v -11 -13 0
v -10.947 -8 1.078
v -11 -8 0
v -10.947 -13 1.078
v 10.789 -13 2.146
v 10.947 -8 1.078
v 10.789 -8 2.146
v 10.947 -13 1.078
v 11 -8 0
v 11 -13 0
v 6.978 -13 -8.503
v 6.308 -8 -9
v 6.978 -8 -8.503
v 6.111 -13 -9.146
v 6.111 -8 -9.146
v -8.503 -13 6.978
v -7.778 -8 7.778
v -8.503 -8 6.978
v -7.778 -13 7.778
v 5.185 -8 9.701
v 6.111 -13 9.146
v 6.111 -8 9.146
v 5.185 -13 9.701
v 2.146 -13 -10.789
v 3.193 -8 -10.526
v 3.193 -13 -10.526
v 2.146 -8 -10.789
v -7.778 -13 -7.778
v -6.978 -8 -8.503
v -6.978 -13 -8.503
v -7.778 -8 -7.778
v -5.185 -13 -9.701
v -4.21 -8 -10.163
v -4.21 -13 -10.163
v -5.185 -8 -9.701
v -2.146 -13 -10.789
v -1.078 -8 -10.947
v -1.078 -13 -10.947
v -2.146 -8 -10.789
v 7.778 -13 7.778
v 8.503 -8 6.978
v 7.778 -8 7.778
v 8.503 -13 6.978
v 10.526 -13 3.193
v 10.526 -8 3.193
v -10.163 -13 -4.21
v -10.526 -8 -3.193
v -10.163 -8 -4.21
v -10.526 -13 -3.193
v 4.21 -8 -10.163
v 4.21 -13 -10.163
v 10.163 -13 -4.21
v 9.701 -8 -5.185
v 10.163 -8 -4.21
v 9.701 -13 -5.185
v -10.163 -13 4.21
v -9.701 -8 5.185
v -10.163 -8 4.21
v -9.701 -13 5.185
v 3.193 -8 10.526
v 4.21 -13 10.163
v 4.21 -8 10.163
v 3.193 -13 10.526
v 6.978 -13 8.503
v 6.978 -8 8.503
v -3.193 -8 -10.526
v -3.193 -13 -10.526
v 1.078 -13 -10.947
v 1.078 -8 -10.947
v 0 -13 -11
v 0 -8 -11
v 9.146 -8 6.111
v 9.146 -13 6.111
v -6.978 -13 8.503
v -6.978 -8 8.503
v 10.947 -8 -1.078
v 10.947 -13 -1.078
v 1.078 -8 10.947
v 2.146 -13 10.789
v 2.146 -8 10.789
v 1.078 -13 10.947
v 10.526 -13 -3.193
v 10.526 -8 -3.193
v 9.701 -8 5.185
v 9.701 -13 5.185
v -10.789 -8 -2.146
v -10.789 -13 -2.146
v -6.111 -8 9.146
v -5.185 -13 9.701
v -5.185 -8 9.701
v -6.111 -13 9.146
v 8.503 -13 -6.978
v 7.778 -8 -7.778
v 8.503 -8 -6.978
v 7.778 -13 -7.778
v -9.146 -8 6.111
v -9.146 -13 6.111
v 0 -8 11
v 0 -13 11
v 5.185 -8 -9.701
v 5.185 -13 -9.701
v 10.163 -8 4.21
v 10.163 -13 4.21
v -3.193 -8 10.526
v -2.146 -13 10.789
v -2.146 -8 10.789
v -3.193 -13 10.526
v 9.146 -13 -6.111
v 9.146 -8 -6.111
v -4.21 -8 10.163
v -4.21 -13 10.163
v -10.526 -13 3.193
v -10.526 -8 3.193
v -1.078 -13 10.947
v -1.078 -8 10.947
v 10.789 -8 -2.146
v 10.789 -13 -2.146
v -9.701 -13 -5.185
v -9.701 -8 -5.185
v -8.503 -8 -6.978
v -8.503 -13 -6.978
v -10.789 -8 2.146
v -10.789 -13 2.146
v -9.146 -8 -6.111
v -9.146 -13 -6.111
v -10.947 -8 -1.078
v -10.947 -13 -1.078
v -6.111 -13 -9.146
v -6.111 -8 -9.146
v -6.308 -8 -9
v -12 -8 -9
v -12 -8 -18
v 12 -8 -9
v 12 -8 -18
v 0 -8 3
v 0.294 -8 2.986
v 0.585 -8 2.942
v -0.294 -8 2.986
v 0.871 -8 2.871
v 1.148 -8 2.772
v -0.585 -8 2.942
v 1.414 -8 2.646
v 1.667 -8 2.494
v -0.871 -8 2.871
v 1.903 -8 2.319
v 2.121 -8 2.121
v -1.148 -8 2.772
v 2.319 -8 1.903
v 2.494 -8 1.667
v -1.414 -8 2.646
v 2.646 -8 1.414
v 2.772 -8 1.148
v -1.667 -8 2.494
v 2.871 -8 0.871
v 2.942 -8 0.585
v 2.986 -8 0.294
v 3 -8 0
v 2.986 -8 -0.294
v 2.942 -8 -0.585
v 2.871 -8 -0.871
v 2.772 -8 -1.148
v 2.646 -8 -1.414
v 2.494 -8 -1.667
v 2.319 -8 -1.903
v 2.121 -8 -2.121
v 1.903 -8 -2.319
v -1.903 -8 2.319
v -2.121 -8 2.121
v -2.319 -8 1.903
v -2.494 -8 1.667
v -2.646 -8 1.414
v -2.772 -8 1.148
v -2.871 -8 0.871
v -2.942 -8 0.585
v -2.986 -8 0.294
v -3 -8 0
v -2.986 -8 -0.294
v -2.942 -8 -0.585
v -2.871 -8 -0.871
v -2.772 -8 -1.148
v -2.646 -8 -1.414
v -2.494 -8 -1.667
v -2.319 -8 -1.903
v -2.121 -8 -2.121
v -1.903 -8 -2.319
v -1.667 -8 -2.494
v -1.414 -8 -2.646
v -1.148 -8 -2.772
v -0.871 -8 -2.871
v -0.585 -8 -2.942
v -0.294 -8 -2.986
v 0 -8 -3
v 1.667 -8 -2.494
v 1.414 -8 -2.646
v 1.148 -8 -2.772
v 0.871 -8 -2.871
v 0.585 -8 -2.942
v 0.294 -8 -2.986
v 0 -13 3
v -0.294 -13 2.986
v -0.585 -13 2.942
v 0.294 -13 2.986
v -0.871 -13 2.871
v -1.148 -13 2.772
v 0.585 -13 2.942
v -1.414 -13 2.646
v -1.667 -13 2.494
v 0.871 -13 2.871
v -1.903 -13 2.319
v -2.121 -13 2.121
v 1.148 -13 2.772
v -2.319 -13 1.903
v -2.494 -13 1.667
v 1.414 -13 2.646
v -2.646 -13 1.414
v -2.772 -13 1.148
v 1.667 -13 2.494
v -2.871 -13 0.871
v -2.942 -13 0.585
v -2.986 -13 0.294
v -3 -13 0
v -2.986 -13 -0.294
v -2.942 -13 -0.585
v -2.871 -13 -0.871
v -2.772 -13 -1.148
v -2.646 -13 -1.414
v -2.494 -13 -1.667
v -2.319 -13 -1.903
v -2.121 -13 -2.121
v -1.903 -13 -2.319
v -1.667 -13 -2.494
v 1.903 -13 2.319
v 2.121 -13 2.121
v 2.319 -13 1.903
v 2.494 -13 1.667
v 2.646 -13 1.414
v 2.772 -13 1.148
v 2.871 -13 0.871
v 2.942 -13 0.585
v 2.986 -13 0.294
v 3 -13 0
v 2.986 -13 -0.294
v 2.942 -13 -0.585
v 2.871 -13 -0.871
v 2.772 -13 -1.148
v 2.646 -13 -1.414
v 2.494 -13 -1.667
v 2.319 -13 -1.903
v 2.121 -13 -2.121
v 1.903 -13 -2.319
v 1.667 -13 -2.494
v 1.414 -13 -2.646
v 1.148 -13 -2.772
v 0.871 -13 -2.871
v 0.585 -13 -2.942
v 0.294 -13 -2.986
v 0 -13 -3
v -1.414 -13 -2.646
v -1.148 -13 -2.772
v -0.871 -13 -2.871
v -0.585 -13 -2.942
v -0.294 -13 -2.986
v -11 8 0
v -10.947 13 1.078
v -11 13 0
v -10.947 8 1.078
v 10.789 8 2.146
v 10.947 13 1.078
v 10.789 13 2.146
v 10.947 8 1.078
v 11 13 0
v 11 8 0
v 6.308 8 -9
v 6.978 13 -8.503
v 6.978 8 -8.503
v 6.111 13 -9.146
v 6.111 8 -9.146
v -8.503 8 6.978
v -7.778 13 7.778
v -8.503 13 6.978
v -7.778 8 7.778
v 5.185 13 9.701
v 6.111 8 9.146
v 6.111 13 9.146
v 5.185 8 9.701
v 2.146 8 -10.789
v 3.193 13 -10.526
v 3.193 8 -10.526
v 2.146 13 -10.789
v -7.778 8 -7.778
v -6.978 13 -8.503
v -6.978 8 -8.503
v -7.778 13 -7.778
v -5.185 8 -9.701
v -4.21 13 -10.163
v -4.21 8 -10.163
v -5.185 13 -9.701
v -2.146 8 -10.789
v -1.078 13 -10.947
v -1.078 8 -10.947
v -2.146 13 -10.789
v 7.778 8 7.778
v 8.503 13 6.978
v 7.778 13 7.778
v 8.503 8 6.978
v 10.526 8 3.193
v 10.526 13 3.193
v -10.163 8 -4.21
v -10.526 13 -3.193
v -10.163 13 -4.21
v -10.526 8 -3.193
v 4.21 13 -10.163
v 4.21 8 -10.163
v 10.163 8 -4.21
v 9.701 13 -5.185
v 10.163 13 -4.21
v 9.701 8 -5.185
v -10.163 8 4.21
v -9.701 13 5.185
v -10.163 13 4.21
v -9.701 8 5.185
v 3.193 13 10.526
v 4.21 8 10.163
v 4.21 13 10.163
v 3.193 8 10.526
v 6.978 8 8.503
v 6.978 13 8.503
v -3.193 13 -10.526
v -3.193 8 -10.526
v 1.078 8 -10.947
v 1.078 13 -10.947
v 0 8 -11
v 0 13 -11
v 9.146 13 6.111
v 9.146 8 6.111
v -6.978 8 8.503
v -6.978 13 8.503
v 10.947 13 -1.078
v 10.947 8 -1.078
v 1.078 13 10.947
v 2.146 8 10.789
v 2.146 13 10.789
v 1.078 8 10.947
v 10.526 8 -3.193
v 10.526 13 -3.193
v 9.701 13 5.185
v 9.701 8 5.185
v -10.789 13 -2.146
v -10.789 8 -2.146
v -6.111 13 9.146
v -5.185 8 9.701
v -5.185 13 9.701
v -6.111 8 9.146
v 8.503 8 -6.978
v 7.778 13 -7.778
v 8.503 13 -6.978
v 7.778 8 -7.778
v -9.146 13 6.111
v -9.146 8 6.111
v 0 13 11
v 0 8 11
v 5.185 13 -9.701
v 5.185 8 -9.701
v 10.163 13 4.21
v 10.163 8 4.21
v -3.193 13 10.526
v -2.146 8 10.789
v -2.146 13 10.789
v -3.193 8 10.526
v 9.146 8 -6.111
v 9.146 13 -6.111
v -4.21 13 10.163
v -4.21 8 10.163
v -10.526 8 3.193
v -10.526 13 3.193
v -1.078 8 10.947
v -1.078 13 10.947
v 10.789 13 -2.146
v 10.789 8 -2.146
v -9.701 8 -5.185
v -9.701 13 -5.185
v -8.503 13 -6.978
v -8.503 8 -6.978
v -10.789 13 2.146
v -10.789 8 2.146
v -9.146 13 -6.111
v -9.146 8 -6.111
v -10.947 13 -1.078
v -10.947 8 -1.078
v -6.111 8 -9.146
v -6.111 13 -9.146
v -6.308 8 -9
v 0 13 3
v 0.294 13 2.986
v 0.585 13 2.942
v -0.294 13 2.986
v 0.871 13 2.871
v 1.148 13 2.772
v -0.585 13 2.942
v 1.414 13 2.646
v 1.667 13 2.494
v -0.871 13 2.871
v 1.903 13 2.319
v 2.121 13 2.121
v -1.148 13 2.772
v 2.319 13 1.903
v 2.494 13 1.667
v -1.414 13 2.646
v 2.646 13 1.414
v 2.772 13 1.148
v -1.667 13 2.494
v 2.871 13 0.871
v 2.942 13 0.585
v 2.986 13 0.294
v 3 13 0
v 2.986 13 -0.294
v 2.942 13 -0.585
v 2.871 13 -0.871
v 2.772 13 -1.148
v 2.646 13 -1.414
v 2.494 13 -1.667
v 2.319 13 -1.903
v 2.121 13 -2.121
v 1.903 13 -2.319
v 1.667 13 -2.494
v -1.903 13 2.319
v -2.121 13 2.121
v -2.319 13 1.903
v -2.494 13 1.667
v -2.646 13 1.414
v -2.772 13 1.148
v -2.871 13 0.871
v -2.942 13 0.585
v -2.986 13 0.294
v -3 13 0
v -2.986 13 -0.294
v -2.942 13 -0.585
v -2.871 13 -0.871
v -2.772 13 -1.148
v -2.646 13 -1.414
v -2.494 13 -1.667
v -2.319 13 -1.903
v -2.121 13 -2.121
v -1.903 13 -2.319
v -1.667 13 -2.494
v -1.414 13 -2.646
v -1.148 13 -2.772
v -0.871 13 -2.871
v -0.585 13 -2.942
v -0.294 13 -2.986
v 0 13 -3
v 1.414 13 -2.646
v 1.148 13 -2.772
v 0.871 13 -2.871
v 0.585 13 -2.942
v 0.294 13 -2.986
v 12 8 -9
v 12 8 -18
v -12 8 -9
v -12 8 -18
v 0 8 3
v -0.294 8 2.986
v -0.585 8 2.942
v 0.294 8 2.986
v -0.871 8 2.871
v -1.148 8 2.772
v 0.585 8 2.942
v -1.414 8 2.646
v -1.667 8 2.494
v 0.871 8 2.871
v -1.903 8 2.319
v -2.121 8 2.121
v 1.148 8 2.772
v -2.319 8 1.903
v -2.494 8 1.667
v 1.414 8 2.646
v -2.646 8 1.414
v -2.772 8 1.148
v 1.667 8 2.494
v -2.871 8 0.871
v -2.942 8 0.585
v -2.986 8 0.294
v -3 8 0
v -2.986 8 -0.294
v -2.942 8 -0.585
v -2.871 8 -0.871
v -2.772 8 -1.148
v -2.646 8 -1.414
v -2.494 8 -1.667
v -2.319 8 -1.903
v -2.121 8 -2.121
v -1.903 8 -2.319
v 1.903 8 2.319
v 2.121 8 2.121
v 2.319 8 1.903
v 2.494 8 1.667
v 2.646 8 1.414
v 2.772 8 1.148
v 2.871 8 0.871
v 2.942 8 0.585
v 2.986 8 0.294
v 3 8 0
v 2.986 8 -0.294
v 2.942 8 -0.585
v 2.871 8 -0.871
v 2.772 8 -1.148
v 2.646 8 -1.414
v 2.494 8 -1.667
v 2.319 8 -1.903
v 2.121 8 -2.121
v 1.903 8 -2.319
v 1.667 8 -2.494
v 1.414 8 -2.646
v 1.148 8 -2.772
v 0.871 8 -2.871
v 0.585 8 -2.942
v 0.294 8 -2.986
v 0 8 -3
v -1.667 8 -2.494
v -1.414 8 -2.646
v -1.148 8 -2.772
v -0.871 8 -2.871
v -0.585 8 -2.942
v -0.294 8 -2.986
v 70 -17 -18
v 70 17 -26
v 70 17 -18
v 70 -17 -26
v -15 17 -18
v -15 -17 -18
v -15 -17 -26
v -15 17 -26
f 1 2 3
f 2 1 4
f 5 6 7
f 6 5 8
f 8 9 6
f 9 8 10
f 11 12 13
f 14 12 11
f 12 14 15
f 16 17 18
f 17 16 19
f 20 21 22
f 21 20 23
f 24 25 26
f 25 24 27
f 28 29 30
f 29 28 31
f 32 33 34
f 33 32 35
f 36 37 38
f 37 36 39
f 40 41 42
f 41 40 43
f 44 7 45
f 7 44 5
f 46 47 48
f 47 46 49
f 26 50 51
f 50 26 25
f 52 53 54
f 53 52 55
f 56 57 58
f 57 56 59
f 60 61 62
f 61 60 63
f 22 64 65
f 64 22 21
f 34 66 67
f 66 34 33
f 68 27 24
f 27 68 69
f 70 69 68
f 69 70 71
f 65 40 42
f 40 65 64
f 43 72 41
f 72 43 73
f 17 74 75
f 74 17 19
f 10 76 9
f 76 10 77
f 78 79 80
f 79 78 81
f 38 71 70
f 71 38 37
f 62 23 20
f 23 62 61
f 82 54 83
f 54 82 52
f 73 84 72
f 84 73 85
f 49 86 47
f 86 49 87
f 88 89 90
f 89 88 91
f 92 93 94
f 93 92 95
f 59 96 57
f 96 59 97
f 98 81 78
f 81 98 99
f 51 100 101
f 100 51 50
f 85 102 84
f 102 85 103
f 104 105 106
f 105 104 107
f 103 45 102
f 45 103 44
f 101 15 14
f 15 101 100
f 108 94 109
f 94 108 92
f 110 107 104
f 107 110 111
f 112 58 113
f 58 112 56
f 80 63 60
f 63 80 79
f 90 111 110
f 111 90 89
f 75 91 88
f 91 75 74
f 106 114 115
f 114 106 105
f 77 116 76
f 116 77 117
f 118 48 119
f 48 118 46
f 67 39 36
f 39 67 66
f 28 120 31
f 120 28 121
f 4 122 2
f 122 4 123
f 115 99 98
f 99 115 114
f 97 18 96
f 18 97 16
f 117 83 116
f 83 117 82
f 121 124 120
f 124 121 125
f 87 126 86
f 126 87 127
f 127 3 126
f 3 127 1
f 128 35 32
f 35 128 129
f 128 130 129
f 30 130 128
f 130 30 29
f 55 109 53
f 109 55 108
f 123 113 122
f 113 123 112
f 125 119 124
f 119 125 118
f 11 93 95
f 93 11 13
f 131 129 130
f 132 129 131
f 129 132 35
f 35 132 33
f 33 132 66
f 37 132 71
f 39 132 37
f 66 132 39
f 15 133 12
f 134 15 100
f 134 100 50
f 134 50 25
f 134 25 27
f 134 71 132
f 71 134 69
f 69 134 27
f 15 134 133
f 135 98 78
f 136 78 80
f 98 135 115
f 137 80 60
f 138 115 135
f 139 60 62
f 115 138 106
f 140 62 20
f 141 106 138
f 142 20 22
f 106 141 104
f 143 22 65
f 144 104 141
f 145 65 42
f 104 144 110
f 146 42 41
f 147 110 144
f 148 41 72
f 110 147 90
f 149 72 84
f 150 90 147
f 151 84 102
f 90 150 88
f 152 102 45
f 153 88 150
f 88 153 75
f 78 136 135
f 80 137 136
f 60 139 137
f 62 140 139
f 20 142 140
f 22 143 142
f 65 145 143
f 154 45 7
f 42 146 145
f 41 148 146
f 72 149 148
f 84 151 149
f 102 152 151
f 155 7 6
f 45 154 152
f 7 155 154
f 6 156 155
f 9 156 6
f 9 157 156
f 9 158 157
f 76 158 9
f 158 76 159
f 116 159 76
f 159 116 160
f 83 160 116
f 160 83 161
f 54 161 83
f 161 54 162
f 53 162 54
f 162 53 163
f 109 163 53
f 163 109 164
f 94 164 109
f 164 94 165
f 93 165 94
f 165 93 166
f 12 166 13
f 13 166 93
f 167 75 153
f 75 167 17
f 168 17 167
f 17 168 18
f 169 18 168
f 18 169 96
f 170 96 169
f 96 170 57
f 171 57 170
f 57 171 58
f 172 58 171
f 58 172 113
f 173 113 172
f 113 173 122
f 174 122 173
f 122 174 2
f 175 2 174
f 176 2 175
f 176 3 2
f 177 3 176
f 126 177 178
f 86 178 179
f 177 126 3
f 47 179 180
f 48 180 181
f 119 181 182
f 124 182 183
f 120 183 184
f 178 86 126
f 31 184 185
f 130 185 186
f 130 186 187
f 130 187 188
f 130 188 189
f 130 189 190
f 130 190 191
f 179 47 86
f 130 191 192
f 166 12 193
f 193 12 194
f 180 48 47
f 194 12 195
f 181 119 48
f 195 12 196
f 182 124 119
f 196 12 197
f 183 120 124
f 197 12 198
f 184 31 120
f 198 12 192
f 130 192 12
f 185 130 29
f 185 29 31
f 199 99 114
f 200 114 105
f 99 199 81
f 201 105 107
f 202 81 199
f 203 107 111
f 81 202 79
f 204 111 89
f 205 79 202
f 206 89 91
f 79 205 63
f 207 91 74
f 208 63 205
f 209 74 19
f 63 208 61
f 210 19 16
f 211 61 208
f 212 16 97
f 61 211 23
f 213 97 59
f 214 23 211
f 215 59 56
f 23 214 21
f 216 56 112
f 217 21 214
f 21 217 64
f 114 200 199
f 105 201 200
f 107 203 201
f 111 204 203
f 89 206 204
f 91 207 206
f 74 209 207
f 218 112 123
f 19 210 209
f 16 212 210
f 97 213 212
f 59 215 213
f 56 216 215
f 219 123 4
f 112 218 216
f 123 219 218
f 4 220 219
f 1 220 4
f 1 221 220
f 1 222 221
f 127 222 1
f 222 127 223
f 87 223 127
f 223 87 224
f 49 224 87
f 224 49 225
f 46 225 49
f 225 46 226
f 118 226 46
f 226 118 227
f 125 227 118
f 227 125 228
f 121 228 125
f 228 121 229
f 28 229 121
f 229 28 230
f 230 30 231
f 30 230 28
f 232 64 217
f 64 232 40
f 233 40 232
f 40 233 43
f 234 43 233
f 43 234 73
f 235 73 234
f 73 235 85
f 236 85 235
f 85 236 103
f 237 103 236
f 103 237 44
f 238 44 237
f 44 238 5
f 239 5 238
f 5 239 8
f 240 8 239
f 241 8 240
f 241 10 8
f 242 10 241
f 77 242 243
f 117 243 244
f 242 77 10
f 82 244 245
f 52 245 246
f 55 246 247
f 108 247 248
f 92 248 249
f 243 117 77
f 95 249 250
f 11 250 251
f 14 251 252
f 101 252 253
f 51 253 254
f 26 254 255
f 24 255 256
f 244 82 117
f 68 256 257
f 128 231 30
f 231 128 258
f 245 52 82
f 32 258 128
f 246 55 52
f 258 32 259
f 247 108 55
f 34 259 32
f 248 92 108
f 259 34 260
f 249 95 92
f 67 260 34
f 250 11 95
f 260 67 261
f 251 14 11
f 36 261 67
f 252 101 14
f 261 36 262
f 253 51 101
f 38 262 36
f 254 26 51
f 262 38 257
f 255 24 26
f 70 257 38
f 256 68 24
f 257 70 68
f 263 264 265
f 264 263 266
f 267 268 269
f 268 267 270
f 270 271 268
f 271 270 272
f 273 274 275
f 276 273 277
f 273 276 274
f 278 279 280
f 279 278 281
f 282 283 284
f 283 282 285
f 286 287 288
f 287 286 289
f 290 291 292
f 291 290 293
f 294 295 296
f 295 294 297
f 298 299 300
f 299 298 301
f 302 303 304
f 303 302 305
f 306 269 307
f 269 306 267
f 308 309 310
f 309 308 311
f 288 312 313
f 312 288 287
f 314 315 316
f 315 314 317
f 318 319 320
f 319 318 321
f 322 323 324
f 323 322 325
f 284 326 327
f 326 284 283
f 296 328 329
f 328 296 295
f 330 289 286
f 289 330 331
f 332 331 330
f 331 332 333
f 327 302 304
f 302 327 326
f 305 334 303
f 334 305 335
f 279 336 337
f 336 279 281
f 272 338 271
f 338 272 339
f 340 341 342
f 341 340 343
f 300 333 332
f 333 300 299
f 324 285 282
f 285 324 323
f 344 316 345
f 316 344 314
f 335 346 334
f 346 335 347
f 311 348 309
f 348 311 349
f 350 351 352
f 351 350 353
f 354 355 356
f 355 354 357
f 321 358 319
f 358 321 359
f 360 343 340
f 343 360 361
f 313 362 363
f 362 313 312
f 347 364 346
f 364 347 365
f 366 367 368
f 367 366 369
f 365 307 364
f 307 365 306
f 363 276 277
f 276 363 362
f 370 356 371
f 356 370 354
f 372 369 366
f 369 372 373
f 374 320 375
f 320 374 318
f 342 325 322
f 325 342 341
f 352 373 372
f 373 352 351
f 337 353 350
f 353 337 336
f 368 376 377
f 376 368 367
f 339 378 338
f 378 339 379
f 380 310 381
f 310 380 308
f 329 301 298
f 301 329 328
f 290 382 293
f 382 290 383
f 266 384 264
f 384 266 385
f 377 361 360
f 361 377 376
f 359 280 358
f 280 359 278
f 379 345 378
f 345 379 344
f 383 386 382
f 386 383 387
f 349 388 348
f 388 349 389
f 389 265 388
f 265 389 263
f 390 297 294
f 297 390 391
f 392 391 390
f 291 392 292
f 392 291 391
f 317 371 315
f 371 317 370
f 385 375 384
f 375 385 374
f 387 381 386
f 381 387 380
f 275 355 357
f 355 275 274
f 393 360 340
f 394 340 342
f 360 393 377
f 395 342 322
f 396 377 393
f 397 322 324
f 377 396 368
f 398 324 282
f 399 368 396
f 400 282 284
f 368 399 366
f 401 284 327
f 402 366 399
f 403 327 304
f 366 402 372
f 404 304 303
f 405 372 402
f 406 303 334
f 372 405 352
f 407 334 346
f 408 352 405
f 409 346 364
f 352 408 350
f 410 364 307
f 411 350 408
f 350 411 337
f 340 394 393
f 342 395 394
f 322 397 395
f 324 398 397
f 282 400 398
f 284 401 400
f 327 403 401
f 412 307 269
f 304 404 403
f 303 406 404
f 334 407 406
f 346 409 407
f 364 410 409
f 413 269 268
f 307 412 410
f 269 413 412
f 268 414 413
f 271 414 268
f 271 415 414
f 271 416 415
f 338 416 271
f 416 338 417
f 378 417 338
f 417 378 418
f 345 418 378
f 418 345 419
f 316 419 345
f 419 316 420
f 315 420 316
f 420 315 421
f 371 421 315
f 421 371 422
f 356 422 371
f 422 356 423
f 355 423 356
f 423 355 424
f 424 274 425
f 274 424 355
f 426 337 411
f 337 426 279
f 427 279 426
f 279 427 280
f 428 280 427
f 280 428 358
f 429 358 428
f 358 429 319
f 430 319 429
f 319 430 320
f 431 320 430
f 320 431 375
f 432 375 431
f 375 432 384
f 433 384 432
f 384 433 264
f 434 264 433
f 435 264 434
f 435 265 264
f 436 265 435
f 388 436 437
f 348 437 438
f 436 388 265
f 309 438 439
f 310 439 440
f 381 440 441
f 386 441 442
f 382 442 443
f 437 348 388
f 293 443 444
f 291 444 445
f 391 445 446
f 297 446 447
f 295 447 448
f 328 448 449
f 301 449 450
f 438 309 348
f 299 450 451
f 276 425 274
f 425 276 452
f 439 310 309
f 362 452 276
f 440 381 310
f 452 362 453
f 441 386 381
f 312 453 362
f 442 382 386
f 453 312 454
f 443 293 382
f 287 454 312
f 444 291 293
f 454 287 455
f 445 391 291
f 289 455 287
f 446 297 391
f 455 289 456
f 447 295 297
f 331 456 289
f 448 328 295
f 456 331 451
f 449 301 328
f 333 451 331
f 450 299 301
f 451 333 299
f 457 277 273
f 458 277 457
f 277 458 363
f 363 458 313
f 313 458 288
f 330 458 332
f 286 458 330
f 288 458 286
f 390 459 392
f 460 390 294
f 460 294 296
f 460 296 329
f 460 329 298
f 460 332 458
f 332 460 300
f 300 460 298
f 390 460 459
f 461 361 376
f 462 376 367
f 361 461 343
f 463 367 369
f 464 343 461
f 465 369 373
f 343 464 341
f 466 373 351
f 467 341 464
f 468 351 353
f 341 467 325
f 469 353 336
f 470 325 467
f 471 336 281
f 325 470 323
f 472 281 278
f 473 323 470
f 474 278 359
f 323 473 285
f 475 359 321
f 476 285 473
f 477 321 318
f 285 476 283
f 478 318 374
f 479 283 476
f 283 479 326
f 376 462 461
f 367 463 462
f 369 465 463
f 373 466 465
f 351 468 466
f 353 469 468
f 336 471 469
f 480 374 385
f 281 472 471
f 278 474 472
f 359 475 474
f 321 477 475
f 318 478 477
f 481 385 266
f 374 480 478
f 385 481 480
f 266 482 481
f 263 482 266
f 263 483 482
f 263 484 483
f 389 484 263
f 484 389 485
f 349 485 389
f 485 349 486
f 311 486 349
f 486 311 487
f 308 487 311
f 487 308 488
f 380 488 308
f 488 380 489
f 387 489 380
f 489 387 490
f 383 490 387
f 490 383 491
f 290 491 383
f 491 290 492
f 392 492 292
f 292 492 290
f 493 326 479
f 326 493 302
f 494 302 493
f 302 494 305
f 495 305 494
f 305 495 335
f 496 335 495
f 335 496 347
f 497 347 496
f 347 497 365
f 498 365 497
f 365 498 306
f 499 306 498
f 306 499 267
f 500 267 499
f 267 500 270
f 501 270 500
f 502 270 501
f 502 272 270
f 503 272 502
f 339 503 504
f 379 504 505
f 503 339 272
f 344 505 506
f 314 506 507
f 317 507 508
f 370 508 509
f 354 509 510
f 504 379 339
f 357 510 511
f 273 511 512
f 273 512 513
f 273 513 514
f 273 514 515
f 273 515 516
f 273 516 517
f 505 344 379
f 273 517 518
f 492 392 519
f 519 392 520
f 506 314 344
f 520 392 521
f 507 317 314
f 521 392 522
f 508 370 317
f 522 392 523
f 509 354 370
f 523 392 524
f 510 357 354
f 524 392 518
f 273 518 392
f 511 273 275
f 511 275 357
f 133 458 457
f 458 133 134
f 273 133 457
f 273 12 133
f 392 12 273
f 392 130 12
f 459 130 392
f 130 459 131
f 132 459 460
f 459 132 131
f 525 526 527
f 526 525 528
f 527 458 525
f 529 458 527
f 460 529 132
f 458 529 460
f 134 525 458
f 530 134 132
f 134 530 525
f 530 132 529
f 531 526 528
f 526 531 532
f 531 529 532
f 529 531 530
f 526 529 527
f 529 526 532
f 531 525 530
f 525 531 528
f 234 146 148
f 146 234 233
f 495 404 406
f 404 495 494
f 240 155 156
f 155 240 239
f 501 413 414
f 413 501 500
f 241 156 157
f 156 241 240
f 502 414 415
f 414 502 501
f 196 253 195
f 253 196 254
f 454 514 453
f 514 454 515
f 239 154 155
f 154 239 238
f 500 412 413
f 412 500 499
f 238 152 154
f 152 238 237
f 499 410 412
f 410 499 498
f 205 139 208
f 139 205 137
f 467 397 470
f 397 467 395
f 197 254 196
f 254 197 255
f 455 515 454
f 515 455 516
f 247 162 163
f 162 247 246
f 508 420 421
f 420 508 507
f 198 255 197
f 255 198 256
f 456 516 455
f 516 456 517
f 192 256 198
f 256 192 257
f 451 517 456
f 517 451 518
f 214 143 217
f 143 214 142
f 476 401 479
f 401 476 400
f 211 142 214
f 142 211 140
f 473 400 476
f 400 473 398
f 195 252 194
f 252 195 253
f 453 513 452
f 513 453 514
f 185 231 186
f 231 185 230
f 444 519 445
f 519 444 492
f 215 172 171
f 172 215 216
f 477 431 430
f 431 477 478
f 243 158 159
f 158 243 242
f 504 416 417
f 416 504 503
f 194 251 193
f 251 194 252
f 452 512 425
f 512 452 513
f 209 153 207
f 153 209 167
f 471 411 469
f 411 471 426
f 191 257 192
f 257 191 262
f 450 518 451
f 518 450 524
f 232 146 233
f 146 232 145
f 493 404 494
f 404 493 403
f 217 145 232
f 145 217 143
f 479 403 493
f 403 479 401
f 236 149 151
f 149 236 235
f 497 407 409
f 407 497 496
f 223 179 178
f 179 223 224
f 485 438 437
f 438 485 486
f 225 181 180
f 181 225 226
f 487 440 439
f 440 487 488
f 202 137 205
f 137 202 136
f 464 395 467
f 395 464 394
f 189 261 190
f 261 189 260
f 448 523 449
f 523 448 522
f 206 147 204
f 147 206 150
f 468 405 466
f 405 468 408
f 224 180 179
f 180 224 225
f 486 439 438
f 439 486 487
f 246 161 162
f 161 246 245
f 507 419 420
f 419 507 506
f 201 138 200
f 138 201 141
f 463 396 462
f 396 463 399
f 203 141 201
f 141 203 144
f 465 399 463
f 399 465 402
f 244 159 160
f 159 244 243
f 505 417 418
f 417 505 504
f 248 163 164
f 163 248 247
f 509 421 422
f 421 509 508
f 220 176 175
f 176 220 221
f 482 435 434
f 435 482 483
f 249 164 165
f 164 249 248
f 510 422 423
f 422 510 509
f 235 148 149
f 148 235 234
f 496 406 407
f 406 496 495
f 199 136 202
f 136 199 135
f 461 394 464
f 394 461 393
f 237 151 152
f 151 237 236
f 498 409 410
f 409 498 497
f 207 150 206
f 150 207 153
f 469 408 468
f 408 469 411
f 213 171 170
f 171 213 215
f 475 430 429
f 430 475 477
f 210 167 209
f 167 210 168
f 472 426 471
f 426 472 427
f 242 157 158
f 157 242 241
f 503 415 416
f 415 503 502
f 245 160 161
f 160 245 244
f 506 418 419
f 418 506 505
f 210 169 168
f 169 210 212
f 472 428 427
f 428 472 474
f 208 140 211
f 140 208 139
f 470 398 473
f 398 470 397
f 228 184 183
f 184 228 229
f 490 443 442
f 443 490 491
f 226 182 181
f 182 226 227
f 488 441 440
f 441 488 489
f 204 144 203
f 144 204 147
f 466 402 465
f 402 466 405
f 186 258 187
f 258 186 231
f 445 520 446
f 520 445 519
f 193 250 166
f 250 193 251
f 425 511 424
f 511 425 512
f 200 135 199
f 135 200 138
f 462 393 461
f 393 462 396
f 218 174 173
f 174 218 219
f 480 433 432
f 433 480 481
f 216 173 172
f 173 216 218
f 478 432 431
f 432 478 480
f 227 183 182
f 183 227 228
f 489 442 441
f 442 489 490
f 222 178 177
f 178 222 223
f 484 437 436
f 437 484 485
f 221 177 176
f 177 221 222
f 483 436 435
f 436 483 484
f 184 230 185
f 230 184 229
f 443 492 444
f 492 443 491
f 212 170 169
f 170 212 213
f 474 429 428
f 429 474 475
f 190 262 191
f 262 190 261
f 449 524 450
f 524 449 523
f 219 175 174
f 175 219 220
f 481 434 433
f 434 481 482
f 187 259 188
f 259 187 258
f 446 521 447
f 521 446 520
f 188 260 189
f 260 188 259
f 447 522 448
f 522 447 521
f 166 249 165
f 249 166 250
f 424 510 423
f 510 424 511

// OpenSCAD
// file: params.scad
$fn = 64;

femur_length_mm = 110;
tibia_length_mm = 100;

hip_hub_width_mm = 22;
hip_hub_radius_mm = 11;
hip_pin_dia_mm = 6;

femur_shaft_prox_dia_mm = 20;
femur_shaft_dist_dia_mm = 16;
femur_prox_offset_mm = 8;
femur_dist_offset_mm = 10;
femur_bridge_height_mm = 8;

knee_fork_gap_mm = 12;
knee_fork_plate_mm = 6;
knee_hub_radius_mm = 13;
knee_pin_dia_mm = 8;

tibia_hub_radius_mm = 10;
tibia_shaft_prox_dia_mm = 14;
tibia_shaft_dist_dia_mm = 10;
tibia_prox_offset_mm = 8;
tibia_dist_offset_mm = 8;

ankle_hub_radius_mm = 9;
ankle_hub_width_mm = 16;
ankle_pin_dia_mm = 6;

knee_angle_deg = 25;
hip_angle_deg = 0;
ankle_angle_deg = -(hip_angle_deg + knee_angle_deg);

hip_base_gap_mm = hip_hub_width_mm;
hip_base_plate_mm = 6;
hip_base_radius_mm = 15;
hip_base_tower_top_mm = 34;
hip_base_tower_width_x_mm = 26;
hip_base_mount_size_x_mm = 70;
hip_base_mount_size_y_mm = 50;
hip_base_mount_thickness_mm = 8;
hip_base_bolt_dia_mm = 6;

foot_plate_mm = 5;
foot_fork_radius_mm = 11;
foot_column_width_x_mm = 24;
foot_column_top_mm = -ankle_hub_radius_mm;
foot_column_bottom_mm = -19;
foot_sole_top_mm = -18;
foot_sole_length_mm = 85;
foot_sole_width_mm = 34;
foot_sole_thickness_mm = 8;
foot_sole_center_x_mm = 27.5;
// main file
include <params.scad>

module foot() {
    difference() {
        union() {
            for (s = [-1, 1])
                translate([0, s * (ankle_hub_width_mm + foot_plate_mm) / 2, 0])
                    rotate([90, 0, 0])
                        cylinder(h = foot_plate_mm, d = 2 * foot_fork_radius_mm, center = true);

            translate([0, 0, (foot_column_top_mm + foot_column_bottom_mm) / 2])
                cube([
                    foot_column_width_x_mm,
                    ankle_hub_width_mm,
                    foot_column_top_mm - foot_column_bottom_mm
                ], center = true);

            translate([
                foot_sole_center_x_mm,
                0,
                foot_sole_top_mm - foot_sole_thickness_mm / 2
            ])
                cube([
                    foot_sole_length_mm,
                    foot_sole_width_mm,
                    foot_sole_thickness_mm
                ], center = true);
        }

        rotate([90, 0, 0])
            cylinder(
                h = ankle_hub_width_mm + 2 * foot_plate_mm + 2,
                d = ankle_pin_dia_mm,
                center = true
            );
    }
}

foot();
